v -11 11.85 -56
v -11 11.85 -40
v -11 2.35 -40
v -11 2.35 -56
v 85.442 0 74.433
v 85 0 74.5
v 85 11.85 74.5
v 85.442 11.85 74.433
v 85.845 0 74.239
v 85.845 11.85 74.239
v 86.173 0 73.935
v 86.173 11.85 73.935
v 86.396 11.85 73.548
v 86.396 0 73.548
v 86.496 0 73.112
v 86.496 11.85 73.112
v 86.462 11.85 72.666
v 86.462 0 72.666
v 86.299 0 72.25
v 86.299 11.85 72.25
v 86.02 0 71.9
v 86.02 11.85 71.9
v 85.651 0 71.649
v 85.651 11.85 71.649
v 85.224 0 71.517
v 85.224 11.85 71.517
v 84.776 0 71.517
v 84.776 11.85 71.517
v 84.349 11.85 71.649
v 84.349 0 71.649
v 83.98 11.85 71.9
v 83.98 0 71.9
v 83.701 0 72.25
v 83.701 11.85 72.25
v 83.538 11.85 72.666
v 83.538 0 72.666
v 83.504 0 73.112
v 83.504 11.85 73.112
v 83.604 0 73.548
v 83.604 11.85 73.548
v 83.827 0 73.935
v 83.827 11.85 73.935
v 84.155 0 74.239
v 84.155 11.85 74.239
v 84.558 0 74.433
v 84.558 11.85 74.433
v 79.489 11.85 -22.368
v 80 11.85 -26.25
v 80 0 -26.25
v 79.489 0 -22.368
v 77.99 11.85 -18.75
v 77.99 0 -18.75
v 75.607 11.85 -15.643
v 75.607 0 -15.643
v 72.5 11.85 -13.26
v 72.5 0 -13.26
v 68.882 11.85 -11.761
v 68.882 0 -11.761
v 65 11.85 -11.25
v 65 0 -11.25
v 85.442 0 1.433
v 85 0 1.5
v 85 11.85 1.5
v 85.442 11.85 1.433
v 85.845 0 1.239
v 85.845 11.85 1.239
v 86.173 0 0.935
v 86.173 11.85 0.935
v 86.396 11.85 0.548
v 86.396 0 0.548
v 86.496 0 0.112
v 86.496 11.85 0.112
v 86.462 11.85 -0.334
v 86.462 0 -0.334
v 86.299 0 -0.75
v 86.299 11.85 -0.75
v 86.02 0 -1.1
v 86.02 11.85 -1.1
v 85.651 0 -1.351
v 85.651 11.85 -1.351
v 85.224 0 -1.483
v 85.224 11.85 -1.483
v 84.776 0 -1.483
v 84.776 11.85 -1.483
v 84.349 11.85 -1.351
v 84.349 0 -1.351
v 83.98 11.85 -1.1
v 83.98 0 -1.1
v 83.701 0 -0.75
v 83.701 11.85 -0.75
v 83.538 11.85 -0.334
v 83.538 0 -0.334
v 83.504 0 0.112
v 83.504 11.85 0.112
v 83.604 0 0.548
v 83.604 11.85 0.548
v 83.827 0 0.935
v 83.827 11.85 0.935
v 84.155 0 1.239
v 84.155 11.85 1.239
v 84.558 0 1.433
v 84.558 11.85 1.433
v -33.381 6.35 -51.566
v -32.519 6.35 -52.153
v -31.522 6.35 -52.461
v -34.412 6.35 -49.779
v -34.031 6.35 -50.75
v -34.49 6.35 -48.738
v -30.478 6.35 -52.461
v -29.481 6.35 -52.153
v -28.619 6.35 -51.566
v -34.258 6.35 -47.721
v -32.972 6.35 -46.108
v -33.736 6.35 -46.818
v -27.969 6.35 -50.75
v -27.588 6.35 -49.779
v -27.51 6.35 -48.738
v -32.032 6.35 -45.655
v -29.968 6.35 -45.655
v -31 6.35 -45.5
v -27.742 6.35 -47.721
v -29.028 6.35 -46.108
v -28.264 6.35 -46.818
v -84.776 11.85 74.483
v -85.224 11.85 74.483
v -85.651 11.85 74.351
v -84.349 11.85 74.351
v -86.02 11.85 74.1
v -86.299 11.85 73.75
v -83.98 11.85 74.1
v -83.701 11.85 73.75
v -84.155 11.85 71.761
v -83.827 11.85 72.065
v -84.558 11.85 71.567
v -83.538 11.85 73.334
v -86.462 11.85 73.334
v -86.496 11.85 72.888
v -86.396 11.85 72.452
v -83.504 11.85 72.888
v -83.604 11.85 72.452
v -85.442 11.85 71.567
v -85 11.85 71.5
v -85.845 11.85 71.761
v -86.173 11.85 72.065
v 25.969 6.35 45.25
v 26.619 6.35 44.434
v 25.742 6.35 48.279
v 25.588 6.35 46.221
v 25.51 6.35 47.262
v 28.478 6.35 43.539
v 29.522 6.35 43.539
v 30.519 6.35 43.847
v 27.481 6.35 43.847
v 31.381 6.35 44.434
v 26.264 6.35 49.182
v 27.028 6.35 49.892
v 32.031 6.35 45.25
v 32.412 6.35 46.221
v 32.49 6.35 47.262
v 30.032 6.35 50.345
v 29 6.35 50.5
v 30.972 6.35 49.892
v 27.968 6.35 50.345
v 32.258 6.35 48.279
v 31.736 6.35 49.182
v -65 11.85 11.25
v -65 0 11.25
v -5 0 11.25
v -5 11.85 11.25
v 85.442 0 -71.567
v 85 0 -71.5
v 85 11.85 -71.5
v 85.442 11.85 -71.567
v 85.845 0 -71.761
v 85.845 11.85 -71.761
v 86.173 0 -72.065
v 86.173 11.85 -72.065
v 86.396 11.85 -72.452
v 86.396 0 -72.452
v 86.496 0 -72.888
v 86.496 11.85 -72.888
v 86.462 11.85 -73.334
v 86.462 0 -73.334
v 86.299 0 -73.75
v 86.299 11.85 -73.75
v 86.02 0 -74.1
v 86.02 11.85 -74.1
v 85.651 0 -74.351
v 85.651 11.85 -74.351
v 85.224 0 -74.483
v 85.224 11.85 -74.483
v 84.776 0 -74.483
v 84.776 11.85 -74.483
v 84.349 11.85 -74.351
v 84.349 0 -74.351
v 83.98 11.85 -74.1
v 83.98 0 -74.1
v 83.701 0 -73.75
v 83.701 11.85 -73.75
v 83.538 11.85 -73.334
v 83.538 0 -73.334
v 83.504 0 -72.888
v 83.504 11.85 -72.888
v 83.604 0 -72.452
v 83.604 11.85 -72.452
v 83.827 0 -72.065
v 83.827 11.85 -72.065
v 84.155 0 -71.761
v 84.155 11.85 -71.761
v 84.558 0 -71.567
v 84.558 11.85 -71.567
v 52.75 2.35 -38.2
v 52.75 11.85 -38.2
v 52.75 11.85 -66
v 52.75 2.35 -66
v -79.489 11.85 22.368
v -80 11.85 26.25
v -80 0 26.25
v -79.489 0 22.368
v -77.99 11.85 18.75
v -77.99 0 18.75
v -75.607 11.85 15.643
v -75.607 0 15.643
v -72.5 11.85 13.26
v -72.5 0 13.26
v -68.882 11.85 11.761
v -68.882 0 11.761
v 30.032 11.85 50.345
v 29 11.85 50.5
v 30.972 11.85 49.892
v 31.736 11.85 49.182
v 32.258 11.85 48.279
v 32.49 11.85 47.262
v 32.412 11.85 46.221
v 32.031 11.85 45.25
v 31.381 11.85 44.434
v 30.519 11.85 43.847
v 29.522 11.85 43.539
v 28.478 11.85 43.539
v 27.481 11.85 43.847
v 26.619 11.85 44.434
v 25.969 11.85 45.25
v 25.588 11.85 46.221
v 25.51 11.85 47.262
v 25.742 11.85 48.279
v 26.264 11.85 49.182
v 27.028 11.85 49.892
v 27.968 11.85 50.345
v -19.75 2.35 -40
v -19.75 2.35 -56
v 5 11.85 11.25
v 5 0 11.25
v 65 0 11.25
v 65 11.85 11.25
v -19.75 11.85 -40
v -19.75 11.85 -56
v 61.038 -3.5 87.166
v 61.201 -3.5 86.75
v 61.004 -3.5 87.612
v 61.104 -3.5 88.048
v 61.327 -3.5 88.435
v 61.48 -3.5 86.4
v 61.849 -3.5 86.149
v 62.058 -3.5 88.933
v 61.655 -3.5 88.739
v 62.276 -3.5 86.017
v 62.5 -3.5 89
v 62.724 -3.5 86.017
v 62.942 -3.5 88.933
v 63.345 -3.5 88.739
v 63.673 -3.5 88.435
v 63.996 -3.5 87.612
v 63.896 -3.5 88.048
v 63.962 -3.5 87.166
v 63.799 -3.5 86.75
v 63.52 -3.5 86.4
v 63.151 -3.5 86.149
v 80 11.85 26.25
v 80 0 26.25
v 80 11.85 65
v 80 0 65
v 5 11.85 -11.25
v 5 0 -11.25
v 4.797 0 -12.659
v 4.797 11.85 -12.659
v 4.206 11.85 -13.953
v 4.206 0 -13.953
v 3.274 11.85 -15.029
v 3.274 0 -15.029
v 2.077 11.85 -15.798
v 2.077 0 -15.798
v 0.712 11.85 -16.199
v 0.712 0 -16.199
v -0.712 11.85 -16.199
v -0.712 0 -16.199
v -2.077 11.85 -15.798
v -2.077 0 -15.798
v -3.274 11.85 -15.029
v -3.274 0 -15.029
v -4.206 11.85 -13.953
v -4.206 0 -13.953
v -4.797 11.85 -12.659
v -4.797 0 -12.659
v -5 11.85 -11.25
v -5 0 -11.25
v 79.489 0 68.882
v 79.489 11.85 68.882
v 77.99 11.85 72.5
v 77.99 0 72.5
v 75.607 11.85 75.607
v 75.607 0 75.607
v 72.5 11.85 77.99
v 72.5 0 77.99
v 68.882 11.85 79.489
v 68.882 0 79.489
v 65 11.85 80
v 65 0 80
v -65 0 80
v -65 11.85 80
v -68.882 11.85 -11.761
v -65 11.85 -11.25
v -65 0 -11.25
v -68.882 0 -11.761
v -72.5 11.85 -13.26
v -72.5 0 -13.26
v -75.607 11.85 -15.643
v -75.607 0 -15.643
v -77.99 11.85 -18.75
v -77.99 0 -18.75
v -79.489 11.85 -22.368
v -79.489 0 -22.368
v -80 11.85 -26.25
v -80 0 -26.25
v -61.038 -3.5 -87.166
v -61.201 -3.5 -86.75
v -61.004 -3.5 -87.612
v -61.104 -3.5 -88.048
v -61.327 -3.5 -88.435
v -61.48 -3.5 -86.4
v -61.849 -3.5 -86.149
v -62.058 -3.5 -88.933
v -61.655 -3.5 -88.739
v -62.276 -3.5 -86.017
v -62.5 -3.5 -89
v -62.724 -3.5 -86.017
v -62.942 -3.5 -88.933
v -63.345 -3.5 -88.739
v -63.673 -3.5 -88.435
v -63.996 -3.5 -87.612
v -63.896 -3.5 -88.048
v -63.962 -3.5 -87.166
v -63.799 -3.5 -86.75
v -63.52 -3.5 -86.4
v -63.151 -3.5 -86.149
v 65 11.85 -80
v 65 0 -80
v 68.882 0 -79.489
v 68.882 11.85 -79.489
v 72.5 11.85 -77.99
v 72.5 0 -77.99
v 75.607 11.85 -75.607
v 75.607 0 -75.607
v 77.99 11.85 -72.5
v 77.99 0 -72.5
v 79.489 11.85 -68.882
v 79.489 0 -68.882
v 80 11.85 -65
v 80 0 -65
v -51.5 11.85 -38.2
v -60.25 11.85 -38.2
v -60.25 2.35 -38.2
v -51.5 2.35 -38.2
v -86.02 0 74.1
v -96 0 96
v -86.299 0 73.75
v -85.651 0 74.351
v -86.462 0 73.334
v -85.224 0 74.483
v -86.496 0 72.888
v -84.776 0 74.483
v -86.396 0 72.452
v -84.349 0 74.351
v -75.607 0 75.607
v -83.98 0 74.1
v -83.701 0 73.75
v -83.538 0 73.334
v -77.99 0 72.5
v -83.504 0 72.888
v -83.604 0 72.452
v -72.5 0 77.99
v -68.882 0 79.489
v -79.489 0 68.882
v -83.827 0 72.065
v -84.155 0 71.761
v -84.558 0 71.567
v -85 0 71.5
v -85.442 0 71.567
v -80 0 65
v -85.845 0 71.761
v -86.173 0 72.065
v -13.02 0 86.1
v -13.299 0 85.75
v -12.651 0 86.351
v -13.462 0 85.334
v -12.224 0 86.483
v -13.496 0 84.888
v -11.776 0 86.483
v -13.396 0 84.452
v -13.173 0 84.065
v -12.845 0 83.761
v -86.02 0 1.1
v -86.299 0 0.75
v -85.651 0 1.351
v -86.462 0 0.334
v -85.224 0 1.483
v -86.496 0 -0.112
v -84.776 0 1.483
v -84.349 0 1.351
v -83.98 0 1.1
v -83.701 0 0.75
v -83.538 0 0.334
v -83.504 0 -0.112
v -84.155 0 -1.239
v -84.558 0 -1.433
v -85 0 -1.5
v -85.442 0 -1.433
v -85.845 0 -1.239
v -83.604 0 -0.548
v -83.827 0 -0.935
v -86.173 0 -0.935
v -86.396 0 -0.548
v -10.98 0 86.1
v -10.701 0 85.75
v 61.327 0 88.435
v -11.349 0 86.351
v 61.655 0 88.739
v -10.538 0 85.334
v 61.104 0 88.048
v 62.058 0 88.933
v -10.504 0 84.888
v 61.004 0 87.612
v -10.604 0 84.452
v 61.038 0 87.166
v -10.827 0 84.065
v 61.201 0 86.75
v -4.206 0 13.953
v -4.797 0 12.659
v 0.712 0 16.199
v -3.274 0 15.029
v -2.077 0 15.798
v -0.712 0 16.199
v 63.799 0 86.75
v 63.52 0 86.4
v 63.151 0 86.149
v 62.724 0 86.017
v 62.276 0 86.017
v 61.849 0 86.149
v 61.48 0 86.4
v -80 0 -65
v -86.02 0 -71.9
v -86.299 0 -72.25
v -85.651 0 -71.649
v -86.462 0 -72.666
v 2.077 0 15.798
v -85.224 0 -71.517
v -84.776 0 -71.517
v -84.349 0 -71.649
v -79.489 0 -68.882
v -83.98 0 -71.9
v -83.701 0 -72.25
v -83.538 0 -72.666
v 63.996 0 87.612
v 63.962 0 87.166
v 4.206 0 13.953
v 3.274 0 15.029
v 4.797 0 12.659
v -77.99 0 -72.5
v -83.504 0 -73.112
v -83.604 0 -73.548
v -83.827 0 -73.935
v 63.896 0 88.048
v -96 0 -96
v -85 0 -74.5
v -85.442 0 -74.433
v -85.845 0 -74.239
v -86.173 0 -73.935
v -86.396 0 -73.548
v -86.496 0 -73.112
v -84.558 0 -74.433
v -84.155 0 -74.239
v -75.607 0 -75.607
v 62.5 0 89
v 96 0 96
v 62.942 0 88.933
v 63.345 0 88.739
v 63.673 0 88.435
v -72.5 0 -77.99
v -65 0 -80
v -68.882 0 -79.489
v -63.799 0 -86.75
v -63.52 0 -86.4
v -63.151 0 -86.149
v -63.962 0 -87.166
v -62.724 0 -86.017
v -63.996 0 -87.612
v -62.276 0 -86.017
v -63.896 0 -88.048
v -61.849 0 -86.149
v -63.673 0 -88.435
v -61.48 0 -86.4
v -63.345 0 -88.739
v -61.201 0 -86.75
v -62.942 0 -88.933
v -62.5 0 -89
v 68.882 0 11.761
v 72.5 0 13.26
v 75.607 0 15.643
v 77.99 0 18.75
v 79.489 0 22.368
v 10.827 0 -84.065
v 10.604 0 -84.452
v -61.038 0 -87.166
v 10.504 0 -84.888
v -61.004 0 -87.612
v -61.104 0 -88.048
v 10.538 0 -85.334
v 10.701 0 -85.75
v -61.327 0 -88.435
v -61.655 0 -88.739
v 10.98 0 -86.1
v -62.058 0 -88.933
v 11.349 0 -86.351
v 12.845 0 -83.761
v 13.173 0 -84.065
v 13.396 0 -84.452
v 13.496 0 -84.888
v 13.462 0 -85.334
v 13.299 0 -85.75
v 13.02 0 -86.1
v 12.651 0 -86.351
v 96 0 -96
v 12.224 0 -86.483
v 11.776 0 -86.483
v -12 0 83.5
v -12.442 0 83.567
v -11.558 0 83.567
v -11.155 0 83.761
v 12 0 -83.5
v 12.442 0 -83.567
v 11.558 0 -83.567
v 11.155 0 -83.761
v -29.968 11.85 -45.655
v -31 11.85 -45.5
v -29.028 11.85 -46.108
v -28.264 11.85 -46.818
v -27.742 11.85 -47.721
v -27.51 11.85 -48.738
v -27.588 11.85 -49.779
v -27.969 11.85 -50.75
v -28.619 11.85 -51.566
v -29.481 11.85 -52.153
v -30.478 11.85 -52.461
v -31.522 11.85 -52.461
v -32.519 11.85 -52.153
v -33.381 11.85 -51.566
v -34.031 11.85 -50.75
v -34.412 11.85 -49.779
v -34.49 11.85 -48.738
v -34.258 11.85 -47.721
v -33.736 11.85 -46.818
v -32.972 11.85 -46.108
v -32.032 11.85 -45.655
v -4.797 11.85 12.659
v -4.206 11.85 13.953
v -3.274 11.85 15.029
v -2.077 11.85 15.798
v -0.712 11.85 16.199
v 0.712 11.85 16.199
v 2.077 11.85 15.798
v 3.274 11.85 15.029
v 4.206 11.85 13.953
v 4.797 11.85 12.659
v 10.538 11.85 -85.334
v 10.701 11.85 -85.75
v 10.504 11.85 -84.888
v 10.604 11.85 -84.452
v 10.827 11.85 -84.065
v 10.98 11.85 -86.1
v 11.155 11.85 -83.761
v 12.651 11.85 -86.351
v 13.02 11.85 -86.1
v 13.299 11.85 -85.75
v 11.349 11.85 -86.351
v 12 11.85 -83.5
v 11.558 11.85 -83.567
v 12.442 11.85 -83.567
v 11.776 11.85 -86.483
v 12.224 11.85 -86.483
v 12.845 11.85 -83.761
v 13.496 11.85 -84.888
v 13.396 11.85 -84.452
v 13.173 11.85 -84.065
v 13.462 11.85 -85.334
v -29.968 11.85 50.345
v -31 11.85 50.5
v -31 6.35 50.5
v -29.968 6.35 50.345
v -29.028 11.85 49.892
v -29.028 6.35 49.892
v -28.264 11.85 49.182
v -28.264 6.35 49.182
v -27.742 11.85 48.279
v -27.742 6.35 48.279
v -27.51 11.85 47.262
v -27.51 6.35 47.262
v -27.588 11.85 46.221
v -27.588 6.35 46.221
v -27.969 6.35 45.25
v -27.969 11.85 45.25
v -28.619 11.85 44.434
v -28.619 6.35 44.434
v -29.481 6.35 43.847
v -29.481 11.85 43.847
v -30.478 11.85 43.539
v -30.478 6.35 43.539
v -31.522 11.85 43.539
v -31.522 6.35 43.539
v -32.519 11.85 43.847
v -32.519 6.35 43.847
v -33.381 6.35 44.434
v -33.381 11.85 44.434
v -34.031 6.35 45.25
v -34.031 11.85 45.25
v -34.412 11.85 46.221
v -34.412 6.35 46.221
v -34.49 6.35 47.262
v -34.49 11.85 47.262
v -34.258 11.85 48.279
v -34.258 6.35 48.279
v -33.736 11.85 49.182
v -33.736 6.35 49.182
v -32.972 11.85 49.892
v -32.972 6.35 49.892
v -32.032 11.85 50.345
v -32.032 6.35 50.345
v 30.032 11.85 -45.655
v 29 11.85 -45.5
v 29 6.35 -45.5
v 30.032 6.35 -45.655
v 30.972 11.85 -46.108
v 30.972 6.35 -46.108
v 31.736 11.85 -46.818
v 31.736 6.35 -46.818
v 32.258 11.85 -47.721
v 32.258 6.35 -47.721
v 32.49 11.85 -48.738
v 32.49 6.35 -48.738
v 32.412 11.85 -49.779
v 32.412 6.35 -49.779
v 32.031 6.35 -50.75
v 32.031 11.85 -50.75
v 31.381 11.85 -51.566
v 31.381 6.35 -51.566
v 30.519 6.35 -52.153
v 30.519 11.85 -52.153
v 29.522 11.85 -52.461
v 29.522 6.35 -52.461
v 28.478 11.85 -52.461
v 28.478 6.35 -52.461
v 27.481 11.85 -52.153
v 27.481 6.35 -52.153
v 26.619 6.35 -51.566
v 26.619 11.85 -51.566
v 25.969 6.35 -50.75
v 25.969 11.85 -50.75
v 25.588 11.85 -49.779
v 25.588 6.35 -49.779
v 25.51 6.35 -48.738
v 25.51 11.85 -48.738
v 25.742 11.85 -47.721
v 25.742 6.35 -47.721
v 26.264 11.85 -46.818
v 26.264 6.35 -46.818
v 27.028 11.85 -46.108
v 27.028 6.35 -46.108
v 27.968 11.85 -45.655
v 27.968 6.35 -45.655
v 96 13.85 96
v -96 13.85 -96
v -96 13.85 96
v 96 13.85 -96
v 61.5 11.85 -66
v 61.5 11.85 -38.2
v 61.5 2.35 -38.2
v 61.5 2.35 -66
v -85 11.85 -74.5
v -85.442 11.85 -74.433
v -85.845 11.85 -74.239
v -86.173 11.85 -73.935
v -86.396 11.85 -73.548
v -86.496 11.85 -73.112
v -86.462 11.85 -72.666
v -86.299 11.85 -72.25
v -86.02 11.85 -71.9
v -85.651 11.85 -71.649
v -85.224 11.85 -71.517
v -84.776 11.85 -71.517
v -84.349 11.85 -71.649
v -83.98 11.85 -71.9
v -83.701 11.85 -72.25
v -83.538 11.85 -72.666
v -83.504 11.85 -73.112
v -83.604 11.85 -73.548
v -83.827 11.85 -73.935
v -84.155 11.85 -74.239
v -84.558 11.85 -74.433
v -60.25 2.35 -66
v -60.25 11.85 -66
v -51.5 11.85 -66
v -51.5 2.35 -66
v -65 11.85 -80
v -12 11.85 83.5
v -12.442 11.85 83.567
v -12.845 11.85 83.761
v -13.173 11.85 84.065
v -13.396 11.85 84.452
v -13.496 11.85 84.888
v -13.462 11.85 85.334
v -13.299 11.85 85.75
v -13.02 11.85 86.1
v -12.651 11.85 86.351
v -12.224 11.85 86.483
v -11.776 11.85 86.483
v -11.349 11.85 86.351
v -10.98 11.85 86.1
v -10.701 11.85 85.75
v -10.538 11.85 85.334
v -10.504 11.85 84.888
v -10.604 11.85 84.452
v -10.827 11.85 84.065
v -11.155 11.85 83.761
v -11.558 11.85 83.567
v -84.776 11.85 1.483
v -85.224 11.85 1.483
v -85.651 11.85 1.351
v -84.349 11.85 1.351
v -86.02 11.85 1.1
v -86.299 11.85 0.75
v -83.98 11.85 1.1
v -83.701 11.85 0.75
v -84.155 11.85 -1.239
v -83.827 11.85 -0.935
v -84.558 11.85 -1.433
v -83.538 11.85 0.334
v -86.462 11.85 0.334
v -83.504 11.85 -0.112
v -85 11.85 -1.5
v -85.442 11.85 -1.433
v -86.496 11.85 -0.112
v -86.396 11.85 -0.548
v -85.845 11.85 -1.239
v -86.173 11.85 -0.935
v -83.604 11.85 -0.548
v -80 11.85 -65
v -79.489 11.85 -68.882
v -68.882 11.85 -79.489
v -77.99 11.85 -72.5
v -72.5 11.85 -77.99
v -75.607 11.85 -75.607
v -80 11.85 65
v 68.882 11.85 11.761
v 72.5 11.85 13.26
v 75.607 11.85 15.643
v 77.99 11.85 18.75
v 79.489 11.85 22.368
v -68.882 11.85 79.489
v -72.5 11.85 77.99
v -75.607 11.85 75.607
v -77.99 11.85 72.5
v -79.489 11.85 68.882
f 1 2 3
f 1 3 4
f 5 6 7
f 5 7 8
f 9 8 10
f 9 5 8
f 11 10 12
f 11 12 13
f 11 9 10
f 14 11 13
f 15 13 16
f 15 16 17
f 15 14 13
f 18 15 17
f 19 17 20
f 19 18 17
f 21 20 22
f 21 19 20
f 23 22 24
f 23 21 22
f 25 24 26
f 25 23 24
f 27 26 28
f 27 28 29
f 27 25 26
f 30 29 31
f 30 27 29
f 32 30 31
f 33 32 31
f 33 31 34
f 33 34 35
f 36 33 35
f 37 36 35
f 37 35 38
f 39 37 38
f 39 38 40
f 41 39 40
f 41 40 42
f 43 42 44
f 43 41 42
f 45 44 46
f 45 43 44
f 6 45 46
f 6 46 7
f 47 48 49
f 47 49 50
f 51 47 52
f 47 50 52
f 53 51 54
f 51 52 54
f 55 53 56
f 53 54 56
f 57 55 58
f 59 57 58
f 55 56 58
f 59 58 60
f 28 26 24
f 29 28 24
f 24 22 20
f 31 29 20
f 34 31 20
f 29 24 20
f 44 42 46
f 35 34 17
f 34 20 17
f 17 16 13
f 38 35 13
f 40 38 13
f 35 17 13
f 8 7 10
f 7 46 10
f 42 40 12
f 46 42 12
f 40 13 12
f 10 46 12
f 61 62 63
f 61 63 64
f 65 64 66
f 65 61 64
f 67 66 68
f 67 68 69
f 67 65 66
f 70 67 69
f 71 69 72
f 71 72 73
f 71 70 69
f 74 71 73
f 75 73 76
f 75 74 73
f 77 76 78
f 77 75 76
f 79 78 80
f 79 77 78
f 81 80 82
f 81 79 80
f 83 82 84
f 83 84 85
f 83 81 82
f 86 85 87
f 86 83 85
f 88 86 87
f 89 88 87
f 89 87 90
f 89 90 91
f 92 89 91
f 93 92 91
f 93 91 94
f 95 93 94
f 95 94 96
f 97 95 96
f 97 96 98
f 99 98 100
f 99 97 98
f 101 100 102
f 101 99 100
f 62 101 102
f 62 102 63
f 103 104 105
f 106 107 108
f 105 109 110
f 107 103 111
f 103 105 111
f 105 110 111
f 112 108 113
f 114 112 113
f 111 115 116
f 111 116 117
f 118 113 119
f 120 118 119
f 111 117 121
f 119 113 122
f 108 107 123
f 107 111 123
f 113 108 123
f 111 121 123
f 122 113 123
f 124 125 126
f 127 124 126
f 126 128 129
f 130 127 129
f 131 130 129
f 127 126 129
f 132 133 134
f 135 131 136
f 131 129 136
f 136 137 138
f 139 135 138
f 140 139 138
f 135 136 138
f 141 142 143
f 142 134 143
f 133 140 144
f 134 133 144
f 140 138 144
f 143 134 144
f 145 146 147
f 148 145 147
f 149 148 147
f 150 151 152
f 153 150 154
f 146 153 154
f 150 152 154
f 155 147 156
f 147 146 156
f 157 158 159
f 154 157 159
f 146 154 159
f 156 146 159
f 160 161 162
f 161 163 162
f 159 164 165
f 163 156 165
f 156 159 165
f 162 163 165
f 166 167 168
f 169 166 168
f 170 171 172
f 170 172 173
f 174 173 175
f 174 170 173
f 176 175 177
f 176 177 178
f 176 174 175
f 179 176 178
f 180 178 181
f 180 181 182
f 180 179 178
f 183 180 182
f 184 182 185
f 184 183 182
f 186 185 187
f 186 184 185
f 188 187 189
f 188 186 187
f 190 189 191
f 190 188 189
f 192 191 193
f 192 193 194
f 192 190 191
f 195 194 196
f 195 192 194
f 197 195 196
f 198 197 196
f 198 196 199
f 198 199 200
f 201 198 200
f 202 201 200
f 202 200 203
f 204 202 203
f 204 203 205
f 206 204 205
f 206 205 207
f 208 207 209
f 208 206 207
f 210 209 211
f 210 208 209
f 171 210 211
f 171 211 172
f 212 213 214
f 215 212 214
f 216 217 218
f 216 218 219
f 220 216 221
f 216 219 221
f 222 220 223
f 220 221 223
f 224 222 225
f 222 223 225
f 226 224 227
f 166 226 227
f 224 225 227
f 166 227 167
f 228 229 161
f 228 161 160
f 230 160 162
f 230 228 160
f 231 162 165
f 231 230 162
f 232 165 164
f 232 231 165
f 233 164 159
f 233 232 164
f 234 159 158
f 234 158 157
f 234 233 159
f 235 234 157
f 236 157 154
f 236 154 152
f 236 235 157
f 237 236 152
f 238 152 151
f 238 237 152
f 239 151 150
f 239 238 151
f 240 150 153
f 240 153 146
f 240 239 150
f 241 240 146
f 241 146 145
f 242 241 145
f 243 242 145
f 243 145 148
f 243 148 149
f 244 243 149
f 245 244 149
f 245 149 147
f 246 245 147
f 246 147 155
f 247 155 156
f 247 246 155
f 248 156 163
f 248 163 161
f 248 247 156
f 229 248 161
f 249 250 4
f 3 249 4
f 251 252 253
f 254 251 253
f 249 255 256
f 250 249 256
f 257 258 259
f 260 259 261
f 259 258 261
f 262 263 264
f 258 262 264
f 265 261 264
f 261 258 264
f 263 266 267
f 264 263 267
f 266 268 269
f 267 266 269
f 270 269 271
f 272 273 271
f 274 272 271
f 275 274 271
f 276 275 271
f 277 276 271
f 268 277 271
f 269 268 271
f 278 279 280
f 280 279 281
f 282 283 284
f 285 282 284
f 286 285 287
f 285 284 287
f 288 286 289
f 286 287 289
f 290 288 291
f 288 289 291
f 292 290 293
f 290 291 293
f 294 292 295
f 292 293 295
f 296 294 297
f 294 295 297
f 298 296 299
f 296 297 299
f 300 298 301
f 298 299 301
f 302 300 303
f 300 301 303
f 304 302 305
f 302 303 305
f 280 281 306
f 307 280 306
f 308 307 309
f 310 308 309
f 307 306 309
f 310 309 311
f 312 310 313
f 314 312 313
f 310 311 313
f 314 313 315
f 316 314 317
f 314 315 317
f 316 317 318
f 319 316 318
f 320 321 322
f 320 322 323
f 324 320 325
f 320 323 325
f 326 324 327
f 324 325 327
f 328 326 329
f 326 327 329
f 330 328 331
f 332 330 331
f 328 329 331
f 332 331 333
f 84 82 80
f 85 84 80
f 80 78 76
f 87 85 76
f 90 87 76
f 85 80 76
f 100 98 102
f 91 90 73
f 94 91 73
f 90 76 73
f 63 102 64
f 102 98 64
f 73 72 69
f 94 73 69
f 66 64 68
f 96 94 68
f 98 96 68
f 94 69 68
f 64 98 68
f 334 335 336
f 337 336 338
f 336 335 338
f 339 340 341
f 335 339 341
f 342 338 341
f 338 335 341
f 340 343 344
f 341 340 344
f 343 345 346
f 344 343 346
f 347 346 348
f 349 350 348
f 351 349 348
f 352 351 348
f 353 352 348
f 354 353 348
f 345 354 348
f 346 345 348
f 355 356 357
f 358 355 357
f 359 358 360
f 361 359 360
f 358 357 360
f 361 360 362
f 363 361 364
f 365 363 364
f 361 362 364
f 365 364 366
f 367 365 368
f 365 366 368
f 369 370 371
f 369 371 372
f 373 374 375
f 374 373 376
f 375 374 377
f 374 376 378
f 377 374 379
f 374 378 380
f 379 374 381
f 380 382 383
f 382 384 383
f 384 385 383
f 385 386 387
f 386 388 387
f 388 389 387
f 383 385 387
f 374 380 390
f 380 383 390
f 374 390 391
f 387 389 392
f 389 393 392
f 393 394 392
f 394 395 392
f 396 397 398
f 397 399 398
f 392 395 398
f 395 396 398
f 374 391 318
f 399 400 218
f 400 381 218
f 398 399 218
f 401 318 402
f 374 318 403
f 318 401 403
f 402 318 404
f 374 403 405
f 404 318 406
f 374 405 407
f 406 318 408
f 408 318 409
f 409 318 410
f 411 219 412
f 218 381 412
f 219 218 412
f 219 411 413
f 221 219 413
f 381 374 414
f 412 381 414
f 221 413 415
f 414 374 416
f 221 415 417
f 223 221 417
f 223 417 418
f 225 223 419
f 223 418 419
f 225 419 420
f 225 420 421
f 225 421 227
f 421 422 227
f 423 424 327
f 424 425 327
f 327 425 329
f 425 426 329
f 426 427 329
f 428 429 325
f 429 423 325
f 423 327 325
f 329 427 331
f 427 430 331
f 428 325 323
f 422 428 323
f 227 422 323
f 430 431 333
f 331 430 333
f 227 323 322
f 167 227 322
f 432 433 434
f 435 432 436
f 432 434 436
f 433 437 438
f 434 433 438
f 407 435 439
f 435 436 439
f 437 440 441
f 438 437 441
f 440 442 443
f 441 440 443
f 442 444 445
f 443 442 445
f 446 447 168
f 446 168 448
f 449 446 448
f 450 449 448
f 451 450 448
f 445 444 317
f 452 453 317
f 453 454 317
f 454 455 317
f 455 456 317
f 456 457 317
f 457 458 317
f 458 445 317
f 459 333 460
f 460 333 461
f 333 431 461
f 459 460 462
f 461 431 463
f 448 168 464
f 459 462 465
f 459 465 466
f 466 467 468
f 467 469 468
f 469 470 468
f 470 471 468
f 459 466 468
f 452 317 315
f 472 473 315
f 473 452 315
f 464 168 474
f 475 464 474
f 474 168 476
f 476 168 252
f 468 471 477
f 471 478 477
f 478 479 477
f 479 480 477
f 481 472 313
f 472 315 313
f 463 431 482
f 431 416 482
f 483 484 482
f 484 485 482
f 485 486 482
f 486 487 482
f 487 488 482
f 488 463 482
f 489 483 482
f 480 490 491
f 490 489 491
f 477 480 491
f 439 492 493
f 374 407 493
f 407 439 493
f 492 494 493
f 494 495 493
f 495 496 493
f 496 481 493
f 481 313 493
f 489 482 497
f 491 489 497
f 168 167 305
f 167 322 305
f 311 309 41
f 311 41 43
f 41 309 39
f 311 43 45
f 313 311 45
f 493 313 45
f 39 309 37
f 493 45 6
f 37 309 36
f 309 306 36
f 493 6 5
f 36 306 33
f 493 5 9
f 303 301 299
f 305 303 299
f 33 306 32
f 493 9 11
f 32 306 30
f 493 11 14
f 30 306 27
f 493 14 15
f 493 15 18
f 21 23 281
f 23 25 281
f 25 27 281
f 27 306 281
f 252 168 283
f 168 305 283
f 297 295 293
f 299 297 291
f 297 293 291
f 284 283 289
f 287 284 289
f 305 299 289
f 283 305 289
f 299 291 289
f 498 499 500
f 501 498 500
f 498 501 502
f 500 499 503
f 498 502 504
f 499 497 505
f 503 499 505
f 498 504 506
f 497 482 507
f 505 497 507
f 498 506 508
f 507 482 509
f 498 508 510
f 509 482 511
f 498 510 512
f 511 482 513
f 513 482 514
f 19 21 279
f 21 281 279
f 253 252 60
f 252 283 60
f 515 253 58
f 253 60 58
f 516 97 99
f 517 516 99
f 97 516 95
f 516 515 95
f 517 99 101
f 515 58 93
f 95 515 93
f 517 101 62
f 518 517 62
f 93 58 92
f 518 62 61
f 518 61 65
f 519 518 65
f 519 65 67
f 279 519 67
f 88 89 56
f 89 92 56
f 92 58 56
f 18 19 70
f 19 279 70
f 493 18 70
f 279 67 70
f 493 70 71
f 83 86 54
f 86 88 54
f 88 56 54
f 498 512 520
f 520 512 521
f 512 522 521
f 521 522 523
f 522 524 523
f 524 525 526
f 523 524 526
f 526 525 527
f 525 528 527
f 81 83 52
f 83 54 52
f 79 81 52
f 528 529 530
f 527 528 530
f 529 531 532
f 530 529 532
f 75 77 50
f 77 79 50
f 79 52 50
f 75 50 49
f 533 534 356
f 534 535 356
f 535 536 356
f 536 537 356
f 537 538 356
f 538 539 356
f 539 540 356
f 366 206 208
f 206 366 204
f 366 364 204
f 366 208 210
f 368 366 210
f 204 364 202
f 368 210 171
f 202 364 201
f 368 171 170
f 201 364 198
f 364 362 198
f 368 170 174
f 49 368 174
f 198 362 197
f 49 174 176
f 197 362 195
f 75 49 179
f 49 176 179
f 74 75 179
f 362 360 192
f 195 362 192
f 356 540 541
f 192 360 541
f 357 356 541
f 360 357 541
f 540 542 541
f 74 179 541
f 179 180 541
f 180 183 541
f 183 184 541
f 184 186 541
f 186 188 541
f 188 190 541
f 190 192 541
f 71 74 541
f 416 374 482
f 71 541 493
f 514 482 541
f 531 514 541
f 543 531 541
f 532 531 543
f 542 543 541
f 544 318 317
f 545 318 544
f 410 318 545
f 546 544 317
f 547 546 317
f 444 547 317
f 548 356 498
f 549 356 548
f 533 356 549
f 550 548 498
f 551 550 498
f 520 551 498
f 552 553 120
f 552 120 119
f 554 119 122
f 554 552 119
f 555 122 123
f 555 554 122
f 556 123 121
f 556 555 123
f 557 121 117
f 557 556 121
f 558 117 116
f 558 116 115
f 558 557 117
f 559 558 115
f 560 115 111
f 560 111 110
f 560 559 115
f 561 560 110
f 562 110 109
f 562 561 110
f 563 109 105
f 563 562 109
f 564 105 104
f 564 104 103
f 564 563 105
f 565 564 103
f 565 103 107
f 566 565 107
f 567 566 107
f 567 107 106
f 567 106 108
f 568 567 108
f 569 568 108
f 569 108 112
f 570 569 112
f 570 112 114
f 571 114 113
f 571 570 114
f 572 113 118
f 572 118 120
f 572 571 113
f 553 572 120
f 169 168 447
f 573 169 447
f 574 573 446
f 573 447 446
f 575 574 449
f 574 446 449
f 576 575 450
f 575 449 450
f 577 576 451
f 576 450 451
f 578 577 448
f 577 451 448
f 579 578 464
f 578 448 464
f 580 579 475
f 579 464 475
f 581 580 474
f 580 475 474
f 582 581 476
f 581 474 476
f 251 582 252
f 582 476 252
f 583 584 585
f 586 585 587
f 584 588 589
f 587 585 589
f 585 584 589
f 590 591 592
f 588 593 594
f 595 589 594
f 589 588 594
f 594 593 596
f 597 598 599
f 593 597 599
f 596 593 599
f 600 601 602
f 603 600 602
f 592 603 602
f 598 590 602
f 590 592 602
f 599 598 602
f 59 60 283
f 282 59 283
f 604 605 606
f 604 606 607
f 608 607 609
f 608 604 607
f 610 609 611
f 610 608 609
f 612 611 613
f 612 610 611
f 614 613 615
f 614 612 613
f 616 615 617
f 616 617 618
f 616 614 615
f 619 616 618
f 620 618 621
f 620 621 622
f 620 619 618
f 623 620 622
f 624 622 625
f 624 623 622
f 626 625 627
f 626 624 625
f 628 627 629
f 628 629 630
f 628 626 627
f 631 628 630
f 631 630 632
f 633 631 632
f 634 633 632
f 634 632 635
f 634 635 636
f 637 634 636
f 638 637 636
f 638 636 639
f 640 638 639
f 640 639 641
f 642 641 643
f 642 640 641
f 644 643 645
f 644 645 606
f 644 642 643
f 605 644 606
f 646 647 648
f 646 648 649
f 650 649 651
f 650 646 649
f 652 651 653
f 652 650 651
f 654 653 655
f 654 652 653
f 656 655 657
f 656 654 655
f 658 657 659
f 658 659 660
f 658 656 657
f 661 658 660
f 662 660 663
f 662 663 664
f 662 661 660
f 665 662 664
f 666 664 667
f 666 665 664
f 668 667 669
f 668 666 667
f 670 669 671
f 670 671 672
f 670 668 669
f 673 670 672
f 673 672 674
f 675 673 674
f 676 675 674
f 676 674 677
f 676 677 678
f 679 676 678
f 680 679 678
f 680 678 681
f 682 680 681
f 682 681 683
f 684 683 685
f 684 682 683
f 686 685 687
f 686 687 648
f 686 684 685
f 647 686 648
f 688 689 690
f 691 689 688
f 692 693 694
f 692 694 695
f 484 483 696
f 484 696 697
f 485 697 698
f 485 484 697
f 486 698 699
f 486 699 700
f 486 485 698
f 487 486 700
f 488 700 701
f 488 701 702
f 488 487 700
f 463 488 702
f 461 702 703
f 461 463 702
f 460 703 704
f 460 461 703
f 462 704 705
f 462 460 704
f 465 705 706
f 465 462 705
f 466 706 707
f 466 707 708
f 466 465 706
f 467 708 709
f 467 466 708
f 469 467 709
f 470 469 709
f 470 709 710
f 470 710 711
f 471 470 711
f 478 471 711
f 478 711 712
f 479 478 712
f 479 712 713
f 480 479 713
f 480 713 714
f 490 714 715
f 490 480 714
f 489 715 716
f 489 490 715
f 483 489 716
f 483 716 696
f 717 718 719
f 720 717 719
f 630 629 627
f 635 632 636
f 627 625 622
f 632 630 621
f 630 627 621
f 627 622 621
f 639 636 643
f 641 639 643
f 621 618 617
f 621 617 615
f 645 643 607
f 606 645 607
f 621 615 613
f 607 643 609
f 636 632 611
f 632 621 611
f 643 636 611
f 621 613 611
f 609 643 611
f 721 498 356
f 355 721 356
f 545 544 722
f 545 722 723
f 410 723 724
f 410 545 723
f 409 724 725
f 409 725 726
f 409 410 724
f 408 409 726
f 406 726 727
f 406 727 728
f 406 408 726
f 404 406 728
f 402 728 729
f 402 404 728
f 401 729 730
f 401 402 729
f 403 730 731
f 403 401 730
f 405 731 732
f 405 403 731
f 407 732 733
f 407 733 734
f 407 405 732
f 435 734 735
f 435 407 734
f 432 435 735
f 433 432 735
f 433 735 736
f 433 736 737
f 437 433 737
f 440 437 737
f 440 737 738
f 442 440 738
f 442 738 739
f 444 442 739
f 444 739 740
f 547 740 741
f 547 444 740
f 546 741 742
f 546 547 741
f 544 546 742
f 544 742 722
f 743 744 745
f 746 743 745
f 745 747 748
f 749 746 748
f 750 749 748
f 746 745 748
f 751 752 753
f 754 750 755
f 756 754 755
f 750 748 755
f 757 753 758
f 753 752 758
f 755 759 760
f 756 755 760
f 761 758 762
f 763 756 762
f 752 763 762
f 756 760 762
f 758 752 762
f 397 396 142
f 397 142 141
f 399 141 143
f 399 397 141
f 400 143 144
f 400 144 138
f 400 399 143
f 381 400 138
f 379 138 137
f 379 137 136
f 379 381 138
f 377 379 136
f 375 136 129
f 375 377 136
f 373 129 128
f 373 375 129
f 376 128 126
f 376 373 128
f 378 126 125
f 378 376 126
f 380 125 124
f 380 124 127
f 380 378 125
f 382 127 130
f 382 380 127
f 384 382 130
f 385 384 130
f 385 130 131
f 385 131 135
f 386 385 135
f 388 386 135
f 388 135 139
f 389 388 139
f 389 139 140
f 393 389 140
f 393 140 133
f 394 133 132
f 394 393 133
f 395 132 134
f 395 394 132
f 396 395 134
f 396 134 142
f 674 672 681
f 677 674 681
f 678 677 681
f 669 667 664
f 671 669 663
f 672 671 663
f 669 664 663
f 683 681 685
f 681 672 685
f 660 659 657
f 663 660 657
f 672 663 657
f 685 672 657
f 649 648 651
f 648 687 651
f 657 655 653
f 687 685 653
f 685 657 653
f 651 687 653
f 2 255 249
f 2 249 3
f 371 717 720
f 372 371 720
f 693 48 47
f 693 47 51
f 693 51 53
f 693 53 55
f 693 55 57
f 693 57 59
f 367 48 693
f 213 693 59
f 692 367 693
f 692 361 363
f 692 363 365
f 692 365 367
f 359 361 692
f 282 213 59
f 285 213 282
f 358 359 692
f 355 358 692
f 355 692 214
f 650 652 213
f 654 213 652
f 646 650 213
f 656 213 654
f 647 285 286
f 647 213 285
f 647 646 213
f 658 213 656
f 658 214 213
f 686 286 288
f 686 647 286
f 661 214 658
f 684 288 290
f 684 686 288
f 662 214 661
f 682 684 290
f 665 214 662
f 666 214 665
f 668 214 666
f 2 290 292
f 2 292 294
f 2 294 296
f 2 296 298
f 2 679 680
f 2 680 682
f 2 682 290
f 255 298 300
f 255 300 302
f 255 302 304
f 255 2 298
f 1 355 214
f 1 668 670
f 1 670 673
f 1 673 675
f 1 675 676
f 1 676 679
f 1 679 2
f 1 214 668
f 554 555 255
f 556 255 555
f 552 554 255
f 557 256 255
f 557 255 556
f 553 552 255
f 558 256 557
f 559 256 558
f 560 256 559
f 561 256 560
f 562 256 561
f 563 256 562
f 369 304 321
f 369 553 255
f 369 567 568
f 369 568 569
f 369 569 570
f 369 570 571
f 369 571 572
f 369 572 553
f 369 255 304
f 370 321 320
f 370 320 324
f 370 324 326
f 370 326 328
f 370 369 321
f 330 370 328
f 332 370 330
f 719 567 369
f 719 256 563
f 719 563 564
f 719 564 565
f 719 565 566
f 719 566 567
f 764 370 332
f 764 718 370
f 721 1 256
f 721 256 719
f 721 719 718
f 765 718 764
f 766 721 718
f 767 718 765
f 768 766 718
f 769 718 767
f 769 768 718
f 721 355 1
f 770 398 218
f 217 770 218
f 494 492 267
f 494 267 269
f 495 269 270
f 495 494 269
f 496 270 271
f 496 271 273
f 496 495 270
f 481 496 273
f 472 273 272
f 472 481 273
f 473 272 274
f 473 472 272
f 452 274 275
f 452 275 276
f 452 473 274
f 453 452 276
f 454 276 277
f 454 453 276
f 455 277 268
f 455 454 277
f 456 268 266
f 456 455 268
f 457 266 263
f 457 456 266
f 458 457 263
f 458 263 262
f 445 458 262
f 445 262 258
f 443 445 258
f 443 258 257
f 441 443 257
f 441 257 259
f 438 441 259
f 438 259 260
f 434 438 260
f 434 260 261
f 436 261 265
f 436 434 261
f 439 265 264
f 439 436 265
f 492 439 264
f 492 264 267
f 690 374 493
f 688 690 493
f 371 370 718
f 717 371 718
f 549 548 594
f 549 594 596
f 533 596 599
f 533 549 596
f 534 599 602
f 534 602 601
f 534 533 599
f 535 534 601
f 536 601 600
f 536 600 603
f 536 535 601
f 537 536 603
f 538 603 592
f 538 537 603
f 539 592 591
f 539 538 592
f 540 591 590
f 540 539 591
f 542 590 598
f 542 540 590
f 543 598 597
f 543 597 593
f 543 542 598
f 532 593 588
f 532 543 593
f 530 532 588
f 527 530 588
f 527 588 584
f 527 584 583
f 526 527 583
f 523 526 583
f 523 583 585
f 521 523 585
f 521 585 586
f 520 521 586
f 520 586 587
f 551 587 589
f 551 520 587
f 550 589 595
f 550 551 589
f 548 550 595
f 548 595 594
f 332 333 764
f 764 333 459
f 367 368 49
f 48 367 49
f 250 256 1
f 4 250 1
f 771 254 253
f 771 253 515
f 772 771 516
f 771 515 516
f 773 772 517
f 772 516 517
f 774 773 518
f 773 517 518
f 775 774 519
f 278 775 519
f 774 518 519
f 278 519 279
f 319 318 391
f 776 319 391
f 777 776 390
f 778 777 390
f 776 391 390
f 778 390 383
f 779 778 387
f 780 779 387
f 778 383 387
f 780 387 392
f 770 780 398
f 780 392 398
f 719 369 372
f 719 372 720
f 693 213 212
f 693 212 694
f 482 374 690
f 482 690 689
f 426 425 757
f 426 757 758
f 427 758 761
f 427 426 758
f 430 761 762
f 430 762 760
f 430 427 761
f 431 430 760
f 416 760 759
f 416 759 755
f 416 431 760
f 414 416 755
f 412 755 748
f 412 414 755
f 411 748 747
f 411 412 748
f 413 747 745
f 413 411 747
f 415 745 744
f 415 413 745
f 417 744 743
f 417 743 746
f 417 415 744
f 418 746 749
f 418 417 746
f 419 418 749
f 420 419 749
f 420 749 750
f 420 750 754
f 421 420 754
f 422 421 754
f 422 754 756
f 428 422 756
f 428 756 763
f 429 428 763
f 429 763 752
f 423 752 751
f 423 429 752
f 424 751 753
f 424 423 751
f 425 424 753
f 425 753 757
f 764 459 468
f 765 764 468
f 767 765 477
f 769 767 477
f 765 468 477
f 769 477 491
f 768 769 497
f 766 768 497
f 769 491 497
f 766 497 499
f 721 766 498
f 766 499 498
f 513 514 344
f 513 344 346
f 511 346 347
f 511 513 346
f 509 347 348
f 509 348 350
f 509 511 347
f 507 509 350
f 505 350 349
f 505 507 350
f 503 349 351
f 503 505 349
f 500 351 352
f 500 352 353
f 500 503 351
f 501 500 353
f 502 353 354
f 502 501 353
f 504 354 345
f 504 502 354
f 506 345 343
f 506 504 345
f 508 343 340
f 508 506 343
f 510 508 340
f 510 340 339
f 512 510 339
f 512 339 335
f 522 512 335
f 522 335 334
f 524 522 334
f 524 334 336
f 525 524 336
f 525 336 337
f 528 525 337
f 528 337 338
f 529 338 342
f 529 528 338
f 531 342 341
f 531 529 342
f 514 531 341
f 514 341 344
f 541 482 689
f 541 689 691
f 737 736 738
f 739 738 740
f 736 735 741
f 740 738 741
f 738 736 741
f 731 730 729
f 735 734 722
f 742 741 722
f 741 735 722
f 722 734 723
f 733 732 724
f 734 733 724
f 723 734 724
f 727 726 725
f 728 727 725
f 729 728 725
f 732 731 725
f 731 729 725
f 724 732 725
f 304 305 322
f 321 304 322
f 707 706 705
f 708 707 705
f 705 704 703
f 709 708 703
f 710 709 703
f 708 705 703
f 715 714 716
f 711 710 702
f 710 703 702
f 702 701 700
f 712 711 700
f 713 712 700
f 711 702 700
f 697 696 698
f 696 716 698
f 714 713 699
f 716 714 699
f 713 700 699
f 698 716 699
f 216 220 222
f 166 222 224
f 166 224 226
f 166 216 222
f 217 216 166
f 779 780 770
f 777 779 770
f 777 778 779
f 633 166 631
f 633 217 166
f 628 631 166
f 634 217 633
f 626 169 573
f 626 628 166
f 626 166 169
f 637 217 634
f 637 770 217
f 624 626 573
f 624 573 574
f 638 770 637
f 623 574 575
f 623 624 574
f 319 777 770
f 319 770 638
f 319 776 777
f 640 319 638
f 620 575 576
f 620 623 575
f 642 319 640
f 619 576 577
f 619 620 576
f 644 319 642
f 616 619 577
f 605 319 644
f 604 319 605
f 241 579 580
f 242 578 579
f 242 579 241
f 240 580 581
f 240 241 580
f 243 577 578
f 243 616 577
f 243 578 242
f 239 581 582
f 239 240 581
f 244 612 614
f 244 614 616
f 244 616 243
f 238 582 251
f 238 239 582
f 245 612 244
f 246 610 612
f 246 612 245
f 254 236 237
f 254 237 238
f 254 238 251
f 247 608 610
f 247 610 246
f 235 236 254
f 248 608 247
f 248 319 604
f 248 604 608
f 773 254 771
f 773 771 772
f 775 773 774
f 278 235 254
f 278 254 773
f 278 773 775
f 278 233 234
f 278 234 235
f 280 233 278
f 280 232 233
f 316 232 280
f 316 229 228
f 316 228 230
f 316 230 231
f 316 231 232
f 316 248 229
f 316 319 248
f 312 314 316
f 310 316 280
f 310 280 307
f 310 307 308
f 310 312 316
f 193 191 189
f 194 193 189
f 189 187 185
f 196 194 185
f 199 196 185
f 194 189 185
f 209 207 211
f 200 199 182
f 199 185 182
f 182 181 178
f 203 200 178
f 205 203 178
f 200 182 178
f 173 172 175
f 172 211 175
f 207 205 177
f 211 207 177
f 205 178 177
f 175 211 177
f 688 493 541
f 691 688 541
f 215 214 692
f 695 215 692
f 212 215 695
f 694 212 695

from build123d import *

# Parameters (mm, degrees)
SKETCH1_W           = 192
SKETCH1_H           = 192
SKETCH1_R           = 1.5
BOSS_EXTRUDE1_DEPTH = 13.85
SKETCH1_3_R         = 1.5
CUT_EXTRUDE1_DEPTH  = 11.85
SKETCH1_4_R         = 1.5
BOSS_EXTRUDE2_DEPTH = 3.5
CIRPATTERN1_COUNT   = 2
BOSS_EXTRUDE4_START = -2
SKETCH2_W           = 8.75
SKETCH2_H           = 27.8
SKETCH2_H_2         = 16
BOSS_EXTRUDE4_DEPTH = 9.5
BOSS_EXTRUDE5_START = -2
SKETCH2_3_R         = 3.5
BOSS_EXTRUDE5_DEPTH = 5.5


with BuildPart() as part:
    # Sketch1 → Boss-Extrude1 (new body)
    # profile 1 of 7: a face of its own
    with BuildSketch(Plane(origin=(0, 0, 0), x_dir=(1, 0, 0), z_dir=(0, 1, 0))):
        Rectangle(SKETCH1_W, SKETCH1_H)
        with Locations((62.5, -87.5)):
            Circle(SKETCH1_R, mode=Mode.SUBTRACT)
        with Locations((12, 85)):
            Circle(SKETCH1_R, mode=Mode.SUBTRACT)
        with Locations((85, 73)):
            Circle(SKETCH1_R, mode=Mode.SUBTRACT)
        with Locations((85, 0)):
            Circle(SKETCH1_R, mode=Mode.SUBTRACT)
        with Locations((85, -73)):
            Circle(SKETCH1_R, mode=Mode.SUBTRACT)
        with BuildLine():
            Line((5, 11.25), (65, 11.25))
            ThreePointArc((65, 11.25), (75.606601718, 15.643398282), (80, 26.25))
            Line((80, 26.25), (80, 65))
            ThreePointArc((80, 65), (75.606601718, 75.606601718), (65, 80))
            Line((65, 80), (-65, 80))
            ThreePointArc((-65, 80), (-75.606601718, 75.606601718), (-80, 65))
            Line((-80, 65), (-80, 26.25))
            ThreePointArc((-80, 26.25), (-75.606601718, 15.643398282), (-65, 11.25))
            Line((-65, 11.25), (-5, 11.25))
            ThreePointArc((-5, 11.25), (0, 16.25), (5, 11.25))
        make_face(mode=Mode.SUBTRACT)
    # profile 2 of 7: a face of its own
    with BuildSketch(Plane(origin=(0, 0, 0), x_dir=(1, 0, 0), z_dir=(0, 1, 0))):
        with BuildLine():
            ThreePointArc((5, 11.25), (0, 16.25), (-5, 11.25))
            Line((-5, 11.25), (-65, 11.25))
            ThreePointArc((-65, 11.25), (-75.606601718, 15.643398282), (-80, 26.25))
            Line((-80, 26.25), (-80, 65))
            ThreePointArc((-80, 65), (-75.606601718, 75.606601718), (-65, 80))
            Line((-65, 80), (65, 80))
            ThreePointArc((65, 80), (75.606601718, 75.606601718), (80, 65))
            Line((80, 65), (80, 26.25))
            ThreePointArc((80, 26.25), (75.606601718, 15.643398282), (65, 11.25))
            Line((65, 11.25), (5, 11.25))
        make_face()
    # profile 3 of 7: a face of its own
    with BuildSketch(Plane(origin=(0, 0, 0), x_dir=(1, 0, 0), z_dir=(0, 1, 0))):
        with Locations((62.5, -87.5)):
            Circle(SKETCH1_R)
    # profile 4 of 7: a face of its own
    with BuildSketch(Plane(origin=(0, 0, 0), x_dir=(1, 0, 0), z_dir=(0, 1, 0))):
        with Locations((85, -73)):
            Circle(SKETCH1_R)
    # profile 5 of 7: a face of its own
    with BuildSketch(Plane(origin=(0, 0, 0), x_dir=(1, 0, 0), z_dir=(0, 1, 0))):
        with Locations((85, 0)):
            Circle(SKETCH1_R)
    # profile 6 of 7: a face of its own
    with BuildSketch(Plane(origin=(0, 0, 0), x_dir=(1, 0, 0), z_dir=(0, 1, 0))):
        with Locations((85, 73)):
            Circle(SKETCH1_R)
    # profile 7 of 7: a face of its own
    with BuildSketch(Plane(origin=(0, 0, 0), x_dir=(1, 0, 0), z_dir=(0, 1, 0))):
        with Locations((12, 85)):
            Circle(SKETCH1_R)
    extrude(amount=BOSS_EXTRUDE1_DEPTH)

    # Sketch1<3> → Cut-Extrude1 (cut)
    with BuildSketch(Plane(origin=(0, 0, 0), x_dir=(1, 0, 0), z_dir=(0, 1, 0))):
        with BuildLine():
            ThreePointArc((5, 11.25), (0, 16.25), (-5, 11.25))
            Line((-5, 11.25), (-65, 11.25))
            ThreePointArc((-65, 11.25), (-75.606601718, 15.643398282), (-80, 26.25))
            Line((-80, 26.25), (-80, 65))
            ThreePointArc((-80, 65), (-75.606601718, 75.606601718), (-65, 80))
            Line((-65, 80), (65, 80))
            ThreePointArc((65, 80), (75.606601718, 75.606601718), (80, 65))
            Line((80, 65), (80, 26.25))
            ThreePointArc((80, 26.25), (75.606601718, 15.643398282), (65, 11.25))
            Line((65, 11.25), (5, 11.25))
        make_face()
        with Locations(Location((85, -73, 0), (0, 0, 270))):
            Circle(SKETCH1_3_R)
        with Locations(Location((85, 73, 0), (0, 0, 270))):
            Circle(SKETCH1_3_R)
        with Locations(Location((12, 85, 0), (0, 0, 270))):
            Circle(SKETCH1_3_R)
        with Locations(Location((85, 0, 0), (0, 0, 270))):
            Circle(SKETCH1_3_R)
    cut_extrude1 = extrude(amount=CUT_EXTRUDE1_DEPTH, mode=Mode.SUBTRACT)

    # Sketch1<4> → Boss-Extrude2 (add)
    with BuildSketch(Plane(origin=(0, 0, 0), x_dir=(1, 0, 0), z_dir=(0, 1, 0))):
        with Locations(Location((62.5, -87.5, 0), (0, 0, 270))):
            Circle(SKETCH1_4_R)
    boss_extrude2 = extrude(amount=-BOSS_EXTRUDE2_DEPTH)

    # CirPattern1: Cut-Extrude1, Boss-Extrude2 ×2 about axis
    cirpattern1_axis = Axis((0, 0, 0), (0, 1, 0))
    add([cut_extrude1.rotate(cirpattern1_axis, i * 360 / CIRPATTERN1_COUNT) for i in range(1, CIRPATTERN1_COUNT)], mode=Mode.SUBTRACT)
    add([boss_extrude2.rotate(cirpattern1_axis, i * 360 / CIRPATTERN1_COUNT) for i in range(1, CIRPATTERN1_COUNT)])

    # Sketch2 → Boss-Extrude4 (add)
    with BuildSketch(Plane(origin=(0, 13.85, 0), x_dir=(1, 0, 0), z_dir=(0, 1, 0)).offset(BOSS_EXTRUDE4_START)):
        with Locations((57.125, 52.1)):
            Rectangle(SKETCH2_W, SKETCH2_H)
        with Locations((-15.375, 48)):
            Rectangle(SKETCH2_W, SKETCH2_H_2)
        with Locations((-55.875, 52.1)):
            Rectangle(SKETCH2_W, SKETCH2_H)
    extrude(amount=-BOSS_EXTRUDE4_DEPTH)

    # Sketch2<3> → Boss-Extrude5 (add)
    with BuildSketch(Plane(origin=(0, 13.85, 0), x_dir=(1, 0, 0), z_dir=(0, 1, 0)).offset(BOSS_EXTRUDE5_START)):
        with Locations(Location((29, 49, 0), (0, 0, 270))):
            Circle(SKETCH2_3_R)
        with Locations(Location((-31, 49, 0), (0, 0, 270))):
            Circle(SKETCH2_3_R)
        with Locations(Location((29, -47, 0), (0, 0, 270))):
            Circle(SKETCH2_3_R)
        with Locations(Location((-31, -47, 0), (0, 0, 270))):
            Circle(SKETCH2_3_R)
    extrude(amount=-BOSS_EXTRUDE5_DEPTH)


solid = part.part
